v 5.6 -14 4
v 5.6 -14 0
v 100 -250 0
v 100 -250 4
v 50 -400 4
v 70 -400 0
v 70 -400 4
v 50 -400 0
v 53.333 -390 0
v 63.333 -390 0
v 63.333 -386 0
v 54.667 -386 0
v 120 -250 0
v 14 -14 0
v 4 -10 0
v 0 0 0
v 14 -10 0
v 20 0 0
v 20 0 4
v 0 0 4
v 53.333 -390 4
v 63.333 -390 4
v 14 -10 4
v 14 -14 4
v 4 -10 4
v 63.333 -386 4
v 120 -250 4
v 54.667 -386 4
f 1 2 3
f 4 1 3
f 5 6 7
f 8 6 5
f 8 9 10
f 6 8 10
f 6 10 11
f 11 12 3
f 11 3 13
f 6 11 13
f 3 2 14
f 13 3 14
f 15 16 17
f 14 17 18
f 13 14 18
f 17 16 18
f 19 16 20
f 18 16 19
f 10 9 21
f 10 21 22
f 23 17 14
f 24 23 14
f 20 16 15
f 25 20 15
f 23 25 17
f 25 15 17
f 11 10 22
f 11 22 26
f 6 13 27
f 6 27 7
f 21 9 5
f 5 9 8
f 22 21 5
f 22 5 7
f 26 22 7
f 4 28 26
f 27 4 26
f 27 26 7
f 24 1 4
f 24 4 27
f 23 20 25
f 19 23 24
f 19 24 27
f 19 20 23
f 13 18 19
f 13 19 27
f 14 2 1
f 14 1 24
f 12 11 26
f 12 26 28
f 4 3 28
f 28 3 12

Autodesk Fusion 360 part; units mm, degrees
sketch "Sketch1" plane through (0, 0, 0) normal (0, 0, 1) x (1, 0, 0)
  line L0 (0, 0) -> (20, 0)
  line L1 (20, 0) -> (120, -250)
  line L2 (120, -250) -> (70, -400)
  line L3 (70, -400) -> (50, -400)
  line L4 (4, -10) -> (14, -10)
  line L5 (53.3333, -390) -> (63.3333, -390)
  line L6 (63.3333, -386) -> (54.6667, -386)
  line L7 (100, -250) -> (54.6667, -386)
  line L8 (53.3333, -390) -> (50, -400)
  line L9 (0, 0) -> (4, -10)
  line L10 (5.6, -14) -> (100, -250)
  line L11 (14, -10) -> (14, -14)
  line L12 (5.6, -14) -> (14, -14)
  line L13 (63.3333, -390) -> (63.3333, -386)
  dimension "d4" = 400
  dimension "d5" = 50
  dimension "d6" = 50
  dimension "d7" = 250
  dimension "d9" = 20
  dimension "d10" = 20
  dimension "d11" = 20
  dimension "d12" = 10
  dimension "d13" = 4
  dimension "d14" = 10
  dimension "d15" = 10
  dimension "d16" = 4
  dimension "d17" = 10
  dimension "d27" = 4
extrude "Extrude1" add sketch "Sketch1" along normal blind 4
sketch "Sketch1 (2)" plane through (0, 0, 0) normal (0, 0, 1) x (1, 0, 0) in component "Lampi1"
component "Lampi1" placed x (1, 0, 0) y (0, 1, 0) z (0, 0, 1) at (0, 0, 0)
equation "d4 = haed_skerms"
equation "d5 = umfram_radius"
equation "d6 = umfram_radius"
equation "d7 = haed_u"
equation "d9 = þykkt_eining"
equation "d10 = þykkt_eining"
equation "d11 = þykkt_eining"
equation "d12 = dypt_pressfit"
equation "d13 = þykkt"
equation "d14 = dypt_pressfit"
equation "d15 = dypt_pressfit"
equation "d16 = þykkt"
equation "d17 = dypt_pressfit"
equation "haed_skerms = 400 mm"
equation "haed_u = 250 mm"
equation "head_l = 150 mm"
equation "þykkt = 4 mm"
equation "dypt_pressfit = 10 mm"
equation "umfram_radius = 50 mm"
equation "þykkt_eining = 20 mm"
